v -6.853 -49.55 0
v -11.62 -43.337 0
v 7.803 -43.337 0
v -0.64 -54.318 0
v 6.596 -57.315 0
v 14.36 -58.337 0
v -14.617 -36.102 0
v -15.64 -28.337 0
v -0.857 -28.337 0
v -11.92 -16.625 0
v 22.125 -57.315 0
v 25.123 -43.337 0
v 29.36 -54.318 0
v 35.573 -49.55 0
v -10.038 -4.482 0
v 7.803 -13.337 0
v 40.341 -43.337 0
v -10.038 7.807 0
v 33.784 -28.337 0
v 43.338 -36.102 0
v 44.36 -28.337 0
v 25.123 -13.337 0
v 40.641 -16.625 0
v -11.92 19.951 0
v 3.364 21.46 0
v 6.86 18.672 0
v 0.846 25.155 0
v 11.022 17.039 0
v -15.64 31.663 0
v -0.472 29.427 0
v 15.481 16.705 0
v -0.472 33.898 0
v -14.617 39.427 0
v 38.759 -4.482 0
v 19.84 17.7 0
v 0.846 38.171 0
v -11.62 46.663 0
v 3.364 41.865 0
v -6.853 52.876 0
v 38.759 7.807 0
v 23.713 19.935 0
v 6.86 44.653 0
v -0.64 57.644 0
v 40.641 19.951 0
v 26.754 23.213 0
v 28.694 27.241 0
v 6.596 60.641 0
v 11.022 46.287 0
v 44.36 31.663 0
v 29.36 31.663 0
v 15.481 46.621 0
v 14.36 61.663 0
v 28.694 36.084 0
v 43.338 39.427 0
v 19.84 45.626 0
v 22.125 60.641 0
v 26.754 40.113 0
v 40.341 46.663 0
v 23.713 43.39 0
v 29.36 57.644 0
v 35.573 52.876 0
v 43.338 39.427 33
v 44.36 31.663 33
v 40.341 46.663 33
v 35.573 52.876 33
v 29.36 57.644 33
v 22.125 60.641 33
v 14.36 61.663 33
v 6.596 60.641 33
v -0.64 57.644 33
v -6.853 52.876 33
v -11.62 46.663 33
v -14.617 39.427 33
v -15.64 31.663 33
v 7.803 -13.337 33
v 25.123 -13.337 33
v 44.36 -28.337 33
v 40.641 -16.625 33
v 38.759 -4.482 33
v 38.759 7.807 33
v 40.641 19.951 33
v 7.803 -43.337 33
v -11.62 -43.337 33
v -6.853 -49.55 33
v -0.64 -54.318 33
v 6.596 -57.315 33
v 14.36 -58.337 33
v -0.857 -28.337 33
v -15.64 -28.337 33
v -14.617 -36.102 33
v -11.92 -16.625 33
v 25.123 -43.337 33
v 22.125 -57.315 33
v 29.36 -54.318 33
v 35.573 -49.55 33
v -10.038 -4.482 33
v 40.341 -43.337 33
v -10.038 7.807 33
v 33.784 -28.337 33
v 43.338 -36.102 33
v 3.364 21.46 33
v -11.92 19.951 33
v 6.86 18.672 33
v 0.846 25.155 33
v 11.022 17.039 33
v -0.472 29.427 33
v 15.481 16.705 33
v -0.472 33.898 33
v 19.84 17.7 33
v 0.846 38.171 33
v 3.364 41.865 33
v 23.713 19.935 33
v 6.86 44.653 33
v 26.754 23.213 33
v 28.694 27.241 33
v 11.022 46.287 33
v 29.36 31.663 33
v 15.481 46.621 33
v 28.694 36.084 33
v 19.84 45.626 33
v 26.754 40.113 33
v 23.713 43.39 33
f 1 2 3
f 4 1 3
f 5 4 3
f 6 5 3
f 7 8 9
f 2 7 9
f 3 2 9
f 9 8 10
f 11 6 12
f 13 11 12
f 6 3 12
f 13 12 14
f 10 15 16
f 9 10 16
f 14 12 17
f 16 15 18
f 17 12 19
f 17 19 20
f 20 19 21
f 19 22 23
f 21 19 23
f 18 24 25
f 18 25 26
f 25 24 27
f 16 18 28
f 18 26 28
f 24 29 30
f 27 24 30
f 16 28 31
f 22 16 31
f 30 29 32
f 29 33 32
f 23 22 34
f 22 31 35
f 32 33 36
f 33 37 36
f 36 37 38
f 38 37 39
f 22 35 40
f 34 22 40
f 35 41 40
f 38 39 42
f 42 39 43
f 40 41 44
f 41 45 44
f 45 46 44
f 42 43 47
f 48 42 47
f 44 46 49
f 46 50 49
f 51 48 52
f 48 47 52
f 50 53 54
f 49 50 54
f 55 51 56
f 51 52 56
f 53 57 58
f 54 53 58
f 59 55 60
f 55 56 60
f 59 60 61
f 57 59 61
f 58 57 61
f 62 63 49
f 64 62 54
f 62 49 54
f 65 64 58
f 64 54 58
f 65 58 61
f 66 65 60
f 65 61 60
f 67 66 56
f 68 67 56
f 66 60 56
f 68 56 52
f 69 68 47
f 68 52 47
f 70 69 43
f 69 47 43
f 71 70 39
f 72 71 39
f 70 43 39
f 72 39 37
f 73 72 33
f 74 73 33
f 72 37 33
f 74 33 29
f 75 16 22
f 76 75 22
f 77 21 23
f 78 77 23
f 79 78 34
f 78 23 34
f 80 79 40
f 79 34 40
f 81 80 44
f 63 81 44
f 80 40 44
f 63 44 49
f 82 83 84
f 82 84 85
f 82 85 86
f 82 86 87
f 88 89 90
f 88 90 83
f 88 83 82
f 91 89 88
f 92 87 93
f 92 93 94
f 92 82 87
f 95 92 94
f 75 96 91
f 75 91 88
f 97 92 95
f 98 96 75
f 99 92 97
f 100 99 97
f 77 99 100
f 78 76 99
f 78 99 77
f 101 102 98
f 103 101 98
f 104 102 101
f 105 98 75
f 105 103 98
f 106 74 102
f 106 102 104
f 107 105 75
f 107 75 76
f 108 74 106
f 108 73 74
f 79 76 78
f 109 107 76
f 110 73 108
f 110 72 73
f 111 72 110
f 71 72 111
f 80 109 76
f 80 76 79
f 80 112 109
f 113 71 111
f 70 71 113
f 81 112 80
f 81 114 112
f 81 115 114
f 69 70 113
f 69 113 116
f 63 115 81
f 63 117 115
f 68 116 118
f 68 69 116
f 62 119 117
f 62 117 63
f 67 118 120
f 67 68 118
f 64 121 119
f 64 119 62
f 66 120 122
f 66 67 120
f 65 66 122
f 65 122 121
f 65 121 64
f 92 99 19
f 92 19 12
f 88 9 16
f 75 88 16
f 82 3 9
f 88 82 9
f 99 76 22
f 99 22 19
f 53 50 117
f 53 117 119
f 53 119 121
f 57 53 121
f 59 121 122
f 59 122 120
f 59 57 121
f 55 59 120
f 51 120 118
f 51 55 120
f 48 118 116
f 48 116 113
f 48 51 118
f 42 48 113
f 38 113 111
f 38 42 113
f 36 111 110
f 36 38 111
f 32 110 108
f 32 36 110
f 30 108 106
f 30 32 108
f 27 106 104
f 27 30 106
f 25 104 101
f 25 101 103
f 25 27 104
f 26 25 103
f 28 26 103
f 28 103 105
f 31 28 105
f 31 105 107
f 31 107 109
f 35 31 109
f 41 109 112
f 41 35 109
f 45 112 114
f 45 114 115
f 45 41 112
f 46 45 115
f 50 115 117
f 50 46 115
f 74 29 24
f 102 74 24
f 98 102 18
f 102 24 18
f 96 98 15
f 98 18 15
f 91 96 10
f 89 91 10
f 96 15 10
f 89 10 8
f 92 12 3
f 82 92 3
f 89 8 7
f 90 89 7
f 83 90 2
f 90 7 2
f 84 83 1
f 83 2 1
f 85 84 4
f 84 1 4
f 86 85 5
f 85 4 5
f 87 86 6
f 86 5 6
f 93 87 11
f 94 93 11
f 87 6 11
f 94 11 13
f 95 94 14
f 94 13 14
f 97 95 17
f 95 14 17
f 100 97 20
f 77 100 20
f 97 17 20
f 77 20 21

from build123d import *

# Parameters (mm, degrees)
F0_R     = 15
F1_DEPTH = 33


with BuildPart() as f1:
    # F0 (on Top) → F1 (new body)
    with BuildSketch(Plane.XY):
        with BuildLine():
            ThreePointArc((-15.6397230178, 31.6627646983), (-9.8017078888, 1.6627646983), (-15.6397230178, -28.3372353017))
            ThreePointArc((-15.6397230178, -28.3372353017), (14.3602769822, -58.3372353017), (44.3602769822, -28.3372353017))
            ThreePointArc((44.3602769822, -28.3372353017), (38.5222618531, 1.6627646983), (44.3602769822, 31.6627646983))
            ThreePointArc((44.3602769822, 31.6627646983), (14.3602769822, 61.6627646983), (-15.6397230178, 31.6627646983))
        make_face()
        Polygon((-0.8574276546, -28.3372353017), (7.8028263832, -13.3372353017), (14.3602769822, -13.3372353017), (25.1233344589, -13.3372353017), (33.7835884968, -28.3372353017), (25.1233344589, -43.3372353017), (7.8028263832, -43.3372353017), align=None, mode=Mode.SUBTRACT)
        with Locations((14.3602769822, 31.6627646983)):
            Circle(F0_R, mode=Mode.SUBTRACT)
    extrude(amount=F1_DEPTH)


solid = f1.part
